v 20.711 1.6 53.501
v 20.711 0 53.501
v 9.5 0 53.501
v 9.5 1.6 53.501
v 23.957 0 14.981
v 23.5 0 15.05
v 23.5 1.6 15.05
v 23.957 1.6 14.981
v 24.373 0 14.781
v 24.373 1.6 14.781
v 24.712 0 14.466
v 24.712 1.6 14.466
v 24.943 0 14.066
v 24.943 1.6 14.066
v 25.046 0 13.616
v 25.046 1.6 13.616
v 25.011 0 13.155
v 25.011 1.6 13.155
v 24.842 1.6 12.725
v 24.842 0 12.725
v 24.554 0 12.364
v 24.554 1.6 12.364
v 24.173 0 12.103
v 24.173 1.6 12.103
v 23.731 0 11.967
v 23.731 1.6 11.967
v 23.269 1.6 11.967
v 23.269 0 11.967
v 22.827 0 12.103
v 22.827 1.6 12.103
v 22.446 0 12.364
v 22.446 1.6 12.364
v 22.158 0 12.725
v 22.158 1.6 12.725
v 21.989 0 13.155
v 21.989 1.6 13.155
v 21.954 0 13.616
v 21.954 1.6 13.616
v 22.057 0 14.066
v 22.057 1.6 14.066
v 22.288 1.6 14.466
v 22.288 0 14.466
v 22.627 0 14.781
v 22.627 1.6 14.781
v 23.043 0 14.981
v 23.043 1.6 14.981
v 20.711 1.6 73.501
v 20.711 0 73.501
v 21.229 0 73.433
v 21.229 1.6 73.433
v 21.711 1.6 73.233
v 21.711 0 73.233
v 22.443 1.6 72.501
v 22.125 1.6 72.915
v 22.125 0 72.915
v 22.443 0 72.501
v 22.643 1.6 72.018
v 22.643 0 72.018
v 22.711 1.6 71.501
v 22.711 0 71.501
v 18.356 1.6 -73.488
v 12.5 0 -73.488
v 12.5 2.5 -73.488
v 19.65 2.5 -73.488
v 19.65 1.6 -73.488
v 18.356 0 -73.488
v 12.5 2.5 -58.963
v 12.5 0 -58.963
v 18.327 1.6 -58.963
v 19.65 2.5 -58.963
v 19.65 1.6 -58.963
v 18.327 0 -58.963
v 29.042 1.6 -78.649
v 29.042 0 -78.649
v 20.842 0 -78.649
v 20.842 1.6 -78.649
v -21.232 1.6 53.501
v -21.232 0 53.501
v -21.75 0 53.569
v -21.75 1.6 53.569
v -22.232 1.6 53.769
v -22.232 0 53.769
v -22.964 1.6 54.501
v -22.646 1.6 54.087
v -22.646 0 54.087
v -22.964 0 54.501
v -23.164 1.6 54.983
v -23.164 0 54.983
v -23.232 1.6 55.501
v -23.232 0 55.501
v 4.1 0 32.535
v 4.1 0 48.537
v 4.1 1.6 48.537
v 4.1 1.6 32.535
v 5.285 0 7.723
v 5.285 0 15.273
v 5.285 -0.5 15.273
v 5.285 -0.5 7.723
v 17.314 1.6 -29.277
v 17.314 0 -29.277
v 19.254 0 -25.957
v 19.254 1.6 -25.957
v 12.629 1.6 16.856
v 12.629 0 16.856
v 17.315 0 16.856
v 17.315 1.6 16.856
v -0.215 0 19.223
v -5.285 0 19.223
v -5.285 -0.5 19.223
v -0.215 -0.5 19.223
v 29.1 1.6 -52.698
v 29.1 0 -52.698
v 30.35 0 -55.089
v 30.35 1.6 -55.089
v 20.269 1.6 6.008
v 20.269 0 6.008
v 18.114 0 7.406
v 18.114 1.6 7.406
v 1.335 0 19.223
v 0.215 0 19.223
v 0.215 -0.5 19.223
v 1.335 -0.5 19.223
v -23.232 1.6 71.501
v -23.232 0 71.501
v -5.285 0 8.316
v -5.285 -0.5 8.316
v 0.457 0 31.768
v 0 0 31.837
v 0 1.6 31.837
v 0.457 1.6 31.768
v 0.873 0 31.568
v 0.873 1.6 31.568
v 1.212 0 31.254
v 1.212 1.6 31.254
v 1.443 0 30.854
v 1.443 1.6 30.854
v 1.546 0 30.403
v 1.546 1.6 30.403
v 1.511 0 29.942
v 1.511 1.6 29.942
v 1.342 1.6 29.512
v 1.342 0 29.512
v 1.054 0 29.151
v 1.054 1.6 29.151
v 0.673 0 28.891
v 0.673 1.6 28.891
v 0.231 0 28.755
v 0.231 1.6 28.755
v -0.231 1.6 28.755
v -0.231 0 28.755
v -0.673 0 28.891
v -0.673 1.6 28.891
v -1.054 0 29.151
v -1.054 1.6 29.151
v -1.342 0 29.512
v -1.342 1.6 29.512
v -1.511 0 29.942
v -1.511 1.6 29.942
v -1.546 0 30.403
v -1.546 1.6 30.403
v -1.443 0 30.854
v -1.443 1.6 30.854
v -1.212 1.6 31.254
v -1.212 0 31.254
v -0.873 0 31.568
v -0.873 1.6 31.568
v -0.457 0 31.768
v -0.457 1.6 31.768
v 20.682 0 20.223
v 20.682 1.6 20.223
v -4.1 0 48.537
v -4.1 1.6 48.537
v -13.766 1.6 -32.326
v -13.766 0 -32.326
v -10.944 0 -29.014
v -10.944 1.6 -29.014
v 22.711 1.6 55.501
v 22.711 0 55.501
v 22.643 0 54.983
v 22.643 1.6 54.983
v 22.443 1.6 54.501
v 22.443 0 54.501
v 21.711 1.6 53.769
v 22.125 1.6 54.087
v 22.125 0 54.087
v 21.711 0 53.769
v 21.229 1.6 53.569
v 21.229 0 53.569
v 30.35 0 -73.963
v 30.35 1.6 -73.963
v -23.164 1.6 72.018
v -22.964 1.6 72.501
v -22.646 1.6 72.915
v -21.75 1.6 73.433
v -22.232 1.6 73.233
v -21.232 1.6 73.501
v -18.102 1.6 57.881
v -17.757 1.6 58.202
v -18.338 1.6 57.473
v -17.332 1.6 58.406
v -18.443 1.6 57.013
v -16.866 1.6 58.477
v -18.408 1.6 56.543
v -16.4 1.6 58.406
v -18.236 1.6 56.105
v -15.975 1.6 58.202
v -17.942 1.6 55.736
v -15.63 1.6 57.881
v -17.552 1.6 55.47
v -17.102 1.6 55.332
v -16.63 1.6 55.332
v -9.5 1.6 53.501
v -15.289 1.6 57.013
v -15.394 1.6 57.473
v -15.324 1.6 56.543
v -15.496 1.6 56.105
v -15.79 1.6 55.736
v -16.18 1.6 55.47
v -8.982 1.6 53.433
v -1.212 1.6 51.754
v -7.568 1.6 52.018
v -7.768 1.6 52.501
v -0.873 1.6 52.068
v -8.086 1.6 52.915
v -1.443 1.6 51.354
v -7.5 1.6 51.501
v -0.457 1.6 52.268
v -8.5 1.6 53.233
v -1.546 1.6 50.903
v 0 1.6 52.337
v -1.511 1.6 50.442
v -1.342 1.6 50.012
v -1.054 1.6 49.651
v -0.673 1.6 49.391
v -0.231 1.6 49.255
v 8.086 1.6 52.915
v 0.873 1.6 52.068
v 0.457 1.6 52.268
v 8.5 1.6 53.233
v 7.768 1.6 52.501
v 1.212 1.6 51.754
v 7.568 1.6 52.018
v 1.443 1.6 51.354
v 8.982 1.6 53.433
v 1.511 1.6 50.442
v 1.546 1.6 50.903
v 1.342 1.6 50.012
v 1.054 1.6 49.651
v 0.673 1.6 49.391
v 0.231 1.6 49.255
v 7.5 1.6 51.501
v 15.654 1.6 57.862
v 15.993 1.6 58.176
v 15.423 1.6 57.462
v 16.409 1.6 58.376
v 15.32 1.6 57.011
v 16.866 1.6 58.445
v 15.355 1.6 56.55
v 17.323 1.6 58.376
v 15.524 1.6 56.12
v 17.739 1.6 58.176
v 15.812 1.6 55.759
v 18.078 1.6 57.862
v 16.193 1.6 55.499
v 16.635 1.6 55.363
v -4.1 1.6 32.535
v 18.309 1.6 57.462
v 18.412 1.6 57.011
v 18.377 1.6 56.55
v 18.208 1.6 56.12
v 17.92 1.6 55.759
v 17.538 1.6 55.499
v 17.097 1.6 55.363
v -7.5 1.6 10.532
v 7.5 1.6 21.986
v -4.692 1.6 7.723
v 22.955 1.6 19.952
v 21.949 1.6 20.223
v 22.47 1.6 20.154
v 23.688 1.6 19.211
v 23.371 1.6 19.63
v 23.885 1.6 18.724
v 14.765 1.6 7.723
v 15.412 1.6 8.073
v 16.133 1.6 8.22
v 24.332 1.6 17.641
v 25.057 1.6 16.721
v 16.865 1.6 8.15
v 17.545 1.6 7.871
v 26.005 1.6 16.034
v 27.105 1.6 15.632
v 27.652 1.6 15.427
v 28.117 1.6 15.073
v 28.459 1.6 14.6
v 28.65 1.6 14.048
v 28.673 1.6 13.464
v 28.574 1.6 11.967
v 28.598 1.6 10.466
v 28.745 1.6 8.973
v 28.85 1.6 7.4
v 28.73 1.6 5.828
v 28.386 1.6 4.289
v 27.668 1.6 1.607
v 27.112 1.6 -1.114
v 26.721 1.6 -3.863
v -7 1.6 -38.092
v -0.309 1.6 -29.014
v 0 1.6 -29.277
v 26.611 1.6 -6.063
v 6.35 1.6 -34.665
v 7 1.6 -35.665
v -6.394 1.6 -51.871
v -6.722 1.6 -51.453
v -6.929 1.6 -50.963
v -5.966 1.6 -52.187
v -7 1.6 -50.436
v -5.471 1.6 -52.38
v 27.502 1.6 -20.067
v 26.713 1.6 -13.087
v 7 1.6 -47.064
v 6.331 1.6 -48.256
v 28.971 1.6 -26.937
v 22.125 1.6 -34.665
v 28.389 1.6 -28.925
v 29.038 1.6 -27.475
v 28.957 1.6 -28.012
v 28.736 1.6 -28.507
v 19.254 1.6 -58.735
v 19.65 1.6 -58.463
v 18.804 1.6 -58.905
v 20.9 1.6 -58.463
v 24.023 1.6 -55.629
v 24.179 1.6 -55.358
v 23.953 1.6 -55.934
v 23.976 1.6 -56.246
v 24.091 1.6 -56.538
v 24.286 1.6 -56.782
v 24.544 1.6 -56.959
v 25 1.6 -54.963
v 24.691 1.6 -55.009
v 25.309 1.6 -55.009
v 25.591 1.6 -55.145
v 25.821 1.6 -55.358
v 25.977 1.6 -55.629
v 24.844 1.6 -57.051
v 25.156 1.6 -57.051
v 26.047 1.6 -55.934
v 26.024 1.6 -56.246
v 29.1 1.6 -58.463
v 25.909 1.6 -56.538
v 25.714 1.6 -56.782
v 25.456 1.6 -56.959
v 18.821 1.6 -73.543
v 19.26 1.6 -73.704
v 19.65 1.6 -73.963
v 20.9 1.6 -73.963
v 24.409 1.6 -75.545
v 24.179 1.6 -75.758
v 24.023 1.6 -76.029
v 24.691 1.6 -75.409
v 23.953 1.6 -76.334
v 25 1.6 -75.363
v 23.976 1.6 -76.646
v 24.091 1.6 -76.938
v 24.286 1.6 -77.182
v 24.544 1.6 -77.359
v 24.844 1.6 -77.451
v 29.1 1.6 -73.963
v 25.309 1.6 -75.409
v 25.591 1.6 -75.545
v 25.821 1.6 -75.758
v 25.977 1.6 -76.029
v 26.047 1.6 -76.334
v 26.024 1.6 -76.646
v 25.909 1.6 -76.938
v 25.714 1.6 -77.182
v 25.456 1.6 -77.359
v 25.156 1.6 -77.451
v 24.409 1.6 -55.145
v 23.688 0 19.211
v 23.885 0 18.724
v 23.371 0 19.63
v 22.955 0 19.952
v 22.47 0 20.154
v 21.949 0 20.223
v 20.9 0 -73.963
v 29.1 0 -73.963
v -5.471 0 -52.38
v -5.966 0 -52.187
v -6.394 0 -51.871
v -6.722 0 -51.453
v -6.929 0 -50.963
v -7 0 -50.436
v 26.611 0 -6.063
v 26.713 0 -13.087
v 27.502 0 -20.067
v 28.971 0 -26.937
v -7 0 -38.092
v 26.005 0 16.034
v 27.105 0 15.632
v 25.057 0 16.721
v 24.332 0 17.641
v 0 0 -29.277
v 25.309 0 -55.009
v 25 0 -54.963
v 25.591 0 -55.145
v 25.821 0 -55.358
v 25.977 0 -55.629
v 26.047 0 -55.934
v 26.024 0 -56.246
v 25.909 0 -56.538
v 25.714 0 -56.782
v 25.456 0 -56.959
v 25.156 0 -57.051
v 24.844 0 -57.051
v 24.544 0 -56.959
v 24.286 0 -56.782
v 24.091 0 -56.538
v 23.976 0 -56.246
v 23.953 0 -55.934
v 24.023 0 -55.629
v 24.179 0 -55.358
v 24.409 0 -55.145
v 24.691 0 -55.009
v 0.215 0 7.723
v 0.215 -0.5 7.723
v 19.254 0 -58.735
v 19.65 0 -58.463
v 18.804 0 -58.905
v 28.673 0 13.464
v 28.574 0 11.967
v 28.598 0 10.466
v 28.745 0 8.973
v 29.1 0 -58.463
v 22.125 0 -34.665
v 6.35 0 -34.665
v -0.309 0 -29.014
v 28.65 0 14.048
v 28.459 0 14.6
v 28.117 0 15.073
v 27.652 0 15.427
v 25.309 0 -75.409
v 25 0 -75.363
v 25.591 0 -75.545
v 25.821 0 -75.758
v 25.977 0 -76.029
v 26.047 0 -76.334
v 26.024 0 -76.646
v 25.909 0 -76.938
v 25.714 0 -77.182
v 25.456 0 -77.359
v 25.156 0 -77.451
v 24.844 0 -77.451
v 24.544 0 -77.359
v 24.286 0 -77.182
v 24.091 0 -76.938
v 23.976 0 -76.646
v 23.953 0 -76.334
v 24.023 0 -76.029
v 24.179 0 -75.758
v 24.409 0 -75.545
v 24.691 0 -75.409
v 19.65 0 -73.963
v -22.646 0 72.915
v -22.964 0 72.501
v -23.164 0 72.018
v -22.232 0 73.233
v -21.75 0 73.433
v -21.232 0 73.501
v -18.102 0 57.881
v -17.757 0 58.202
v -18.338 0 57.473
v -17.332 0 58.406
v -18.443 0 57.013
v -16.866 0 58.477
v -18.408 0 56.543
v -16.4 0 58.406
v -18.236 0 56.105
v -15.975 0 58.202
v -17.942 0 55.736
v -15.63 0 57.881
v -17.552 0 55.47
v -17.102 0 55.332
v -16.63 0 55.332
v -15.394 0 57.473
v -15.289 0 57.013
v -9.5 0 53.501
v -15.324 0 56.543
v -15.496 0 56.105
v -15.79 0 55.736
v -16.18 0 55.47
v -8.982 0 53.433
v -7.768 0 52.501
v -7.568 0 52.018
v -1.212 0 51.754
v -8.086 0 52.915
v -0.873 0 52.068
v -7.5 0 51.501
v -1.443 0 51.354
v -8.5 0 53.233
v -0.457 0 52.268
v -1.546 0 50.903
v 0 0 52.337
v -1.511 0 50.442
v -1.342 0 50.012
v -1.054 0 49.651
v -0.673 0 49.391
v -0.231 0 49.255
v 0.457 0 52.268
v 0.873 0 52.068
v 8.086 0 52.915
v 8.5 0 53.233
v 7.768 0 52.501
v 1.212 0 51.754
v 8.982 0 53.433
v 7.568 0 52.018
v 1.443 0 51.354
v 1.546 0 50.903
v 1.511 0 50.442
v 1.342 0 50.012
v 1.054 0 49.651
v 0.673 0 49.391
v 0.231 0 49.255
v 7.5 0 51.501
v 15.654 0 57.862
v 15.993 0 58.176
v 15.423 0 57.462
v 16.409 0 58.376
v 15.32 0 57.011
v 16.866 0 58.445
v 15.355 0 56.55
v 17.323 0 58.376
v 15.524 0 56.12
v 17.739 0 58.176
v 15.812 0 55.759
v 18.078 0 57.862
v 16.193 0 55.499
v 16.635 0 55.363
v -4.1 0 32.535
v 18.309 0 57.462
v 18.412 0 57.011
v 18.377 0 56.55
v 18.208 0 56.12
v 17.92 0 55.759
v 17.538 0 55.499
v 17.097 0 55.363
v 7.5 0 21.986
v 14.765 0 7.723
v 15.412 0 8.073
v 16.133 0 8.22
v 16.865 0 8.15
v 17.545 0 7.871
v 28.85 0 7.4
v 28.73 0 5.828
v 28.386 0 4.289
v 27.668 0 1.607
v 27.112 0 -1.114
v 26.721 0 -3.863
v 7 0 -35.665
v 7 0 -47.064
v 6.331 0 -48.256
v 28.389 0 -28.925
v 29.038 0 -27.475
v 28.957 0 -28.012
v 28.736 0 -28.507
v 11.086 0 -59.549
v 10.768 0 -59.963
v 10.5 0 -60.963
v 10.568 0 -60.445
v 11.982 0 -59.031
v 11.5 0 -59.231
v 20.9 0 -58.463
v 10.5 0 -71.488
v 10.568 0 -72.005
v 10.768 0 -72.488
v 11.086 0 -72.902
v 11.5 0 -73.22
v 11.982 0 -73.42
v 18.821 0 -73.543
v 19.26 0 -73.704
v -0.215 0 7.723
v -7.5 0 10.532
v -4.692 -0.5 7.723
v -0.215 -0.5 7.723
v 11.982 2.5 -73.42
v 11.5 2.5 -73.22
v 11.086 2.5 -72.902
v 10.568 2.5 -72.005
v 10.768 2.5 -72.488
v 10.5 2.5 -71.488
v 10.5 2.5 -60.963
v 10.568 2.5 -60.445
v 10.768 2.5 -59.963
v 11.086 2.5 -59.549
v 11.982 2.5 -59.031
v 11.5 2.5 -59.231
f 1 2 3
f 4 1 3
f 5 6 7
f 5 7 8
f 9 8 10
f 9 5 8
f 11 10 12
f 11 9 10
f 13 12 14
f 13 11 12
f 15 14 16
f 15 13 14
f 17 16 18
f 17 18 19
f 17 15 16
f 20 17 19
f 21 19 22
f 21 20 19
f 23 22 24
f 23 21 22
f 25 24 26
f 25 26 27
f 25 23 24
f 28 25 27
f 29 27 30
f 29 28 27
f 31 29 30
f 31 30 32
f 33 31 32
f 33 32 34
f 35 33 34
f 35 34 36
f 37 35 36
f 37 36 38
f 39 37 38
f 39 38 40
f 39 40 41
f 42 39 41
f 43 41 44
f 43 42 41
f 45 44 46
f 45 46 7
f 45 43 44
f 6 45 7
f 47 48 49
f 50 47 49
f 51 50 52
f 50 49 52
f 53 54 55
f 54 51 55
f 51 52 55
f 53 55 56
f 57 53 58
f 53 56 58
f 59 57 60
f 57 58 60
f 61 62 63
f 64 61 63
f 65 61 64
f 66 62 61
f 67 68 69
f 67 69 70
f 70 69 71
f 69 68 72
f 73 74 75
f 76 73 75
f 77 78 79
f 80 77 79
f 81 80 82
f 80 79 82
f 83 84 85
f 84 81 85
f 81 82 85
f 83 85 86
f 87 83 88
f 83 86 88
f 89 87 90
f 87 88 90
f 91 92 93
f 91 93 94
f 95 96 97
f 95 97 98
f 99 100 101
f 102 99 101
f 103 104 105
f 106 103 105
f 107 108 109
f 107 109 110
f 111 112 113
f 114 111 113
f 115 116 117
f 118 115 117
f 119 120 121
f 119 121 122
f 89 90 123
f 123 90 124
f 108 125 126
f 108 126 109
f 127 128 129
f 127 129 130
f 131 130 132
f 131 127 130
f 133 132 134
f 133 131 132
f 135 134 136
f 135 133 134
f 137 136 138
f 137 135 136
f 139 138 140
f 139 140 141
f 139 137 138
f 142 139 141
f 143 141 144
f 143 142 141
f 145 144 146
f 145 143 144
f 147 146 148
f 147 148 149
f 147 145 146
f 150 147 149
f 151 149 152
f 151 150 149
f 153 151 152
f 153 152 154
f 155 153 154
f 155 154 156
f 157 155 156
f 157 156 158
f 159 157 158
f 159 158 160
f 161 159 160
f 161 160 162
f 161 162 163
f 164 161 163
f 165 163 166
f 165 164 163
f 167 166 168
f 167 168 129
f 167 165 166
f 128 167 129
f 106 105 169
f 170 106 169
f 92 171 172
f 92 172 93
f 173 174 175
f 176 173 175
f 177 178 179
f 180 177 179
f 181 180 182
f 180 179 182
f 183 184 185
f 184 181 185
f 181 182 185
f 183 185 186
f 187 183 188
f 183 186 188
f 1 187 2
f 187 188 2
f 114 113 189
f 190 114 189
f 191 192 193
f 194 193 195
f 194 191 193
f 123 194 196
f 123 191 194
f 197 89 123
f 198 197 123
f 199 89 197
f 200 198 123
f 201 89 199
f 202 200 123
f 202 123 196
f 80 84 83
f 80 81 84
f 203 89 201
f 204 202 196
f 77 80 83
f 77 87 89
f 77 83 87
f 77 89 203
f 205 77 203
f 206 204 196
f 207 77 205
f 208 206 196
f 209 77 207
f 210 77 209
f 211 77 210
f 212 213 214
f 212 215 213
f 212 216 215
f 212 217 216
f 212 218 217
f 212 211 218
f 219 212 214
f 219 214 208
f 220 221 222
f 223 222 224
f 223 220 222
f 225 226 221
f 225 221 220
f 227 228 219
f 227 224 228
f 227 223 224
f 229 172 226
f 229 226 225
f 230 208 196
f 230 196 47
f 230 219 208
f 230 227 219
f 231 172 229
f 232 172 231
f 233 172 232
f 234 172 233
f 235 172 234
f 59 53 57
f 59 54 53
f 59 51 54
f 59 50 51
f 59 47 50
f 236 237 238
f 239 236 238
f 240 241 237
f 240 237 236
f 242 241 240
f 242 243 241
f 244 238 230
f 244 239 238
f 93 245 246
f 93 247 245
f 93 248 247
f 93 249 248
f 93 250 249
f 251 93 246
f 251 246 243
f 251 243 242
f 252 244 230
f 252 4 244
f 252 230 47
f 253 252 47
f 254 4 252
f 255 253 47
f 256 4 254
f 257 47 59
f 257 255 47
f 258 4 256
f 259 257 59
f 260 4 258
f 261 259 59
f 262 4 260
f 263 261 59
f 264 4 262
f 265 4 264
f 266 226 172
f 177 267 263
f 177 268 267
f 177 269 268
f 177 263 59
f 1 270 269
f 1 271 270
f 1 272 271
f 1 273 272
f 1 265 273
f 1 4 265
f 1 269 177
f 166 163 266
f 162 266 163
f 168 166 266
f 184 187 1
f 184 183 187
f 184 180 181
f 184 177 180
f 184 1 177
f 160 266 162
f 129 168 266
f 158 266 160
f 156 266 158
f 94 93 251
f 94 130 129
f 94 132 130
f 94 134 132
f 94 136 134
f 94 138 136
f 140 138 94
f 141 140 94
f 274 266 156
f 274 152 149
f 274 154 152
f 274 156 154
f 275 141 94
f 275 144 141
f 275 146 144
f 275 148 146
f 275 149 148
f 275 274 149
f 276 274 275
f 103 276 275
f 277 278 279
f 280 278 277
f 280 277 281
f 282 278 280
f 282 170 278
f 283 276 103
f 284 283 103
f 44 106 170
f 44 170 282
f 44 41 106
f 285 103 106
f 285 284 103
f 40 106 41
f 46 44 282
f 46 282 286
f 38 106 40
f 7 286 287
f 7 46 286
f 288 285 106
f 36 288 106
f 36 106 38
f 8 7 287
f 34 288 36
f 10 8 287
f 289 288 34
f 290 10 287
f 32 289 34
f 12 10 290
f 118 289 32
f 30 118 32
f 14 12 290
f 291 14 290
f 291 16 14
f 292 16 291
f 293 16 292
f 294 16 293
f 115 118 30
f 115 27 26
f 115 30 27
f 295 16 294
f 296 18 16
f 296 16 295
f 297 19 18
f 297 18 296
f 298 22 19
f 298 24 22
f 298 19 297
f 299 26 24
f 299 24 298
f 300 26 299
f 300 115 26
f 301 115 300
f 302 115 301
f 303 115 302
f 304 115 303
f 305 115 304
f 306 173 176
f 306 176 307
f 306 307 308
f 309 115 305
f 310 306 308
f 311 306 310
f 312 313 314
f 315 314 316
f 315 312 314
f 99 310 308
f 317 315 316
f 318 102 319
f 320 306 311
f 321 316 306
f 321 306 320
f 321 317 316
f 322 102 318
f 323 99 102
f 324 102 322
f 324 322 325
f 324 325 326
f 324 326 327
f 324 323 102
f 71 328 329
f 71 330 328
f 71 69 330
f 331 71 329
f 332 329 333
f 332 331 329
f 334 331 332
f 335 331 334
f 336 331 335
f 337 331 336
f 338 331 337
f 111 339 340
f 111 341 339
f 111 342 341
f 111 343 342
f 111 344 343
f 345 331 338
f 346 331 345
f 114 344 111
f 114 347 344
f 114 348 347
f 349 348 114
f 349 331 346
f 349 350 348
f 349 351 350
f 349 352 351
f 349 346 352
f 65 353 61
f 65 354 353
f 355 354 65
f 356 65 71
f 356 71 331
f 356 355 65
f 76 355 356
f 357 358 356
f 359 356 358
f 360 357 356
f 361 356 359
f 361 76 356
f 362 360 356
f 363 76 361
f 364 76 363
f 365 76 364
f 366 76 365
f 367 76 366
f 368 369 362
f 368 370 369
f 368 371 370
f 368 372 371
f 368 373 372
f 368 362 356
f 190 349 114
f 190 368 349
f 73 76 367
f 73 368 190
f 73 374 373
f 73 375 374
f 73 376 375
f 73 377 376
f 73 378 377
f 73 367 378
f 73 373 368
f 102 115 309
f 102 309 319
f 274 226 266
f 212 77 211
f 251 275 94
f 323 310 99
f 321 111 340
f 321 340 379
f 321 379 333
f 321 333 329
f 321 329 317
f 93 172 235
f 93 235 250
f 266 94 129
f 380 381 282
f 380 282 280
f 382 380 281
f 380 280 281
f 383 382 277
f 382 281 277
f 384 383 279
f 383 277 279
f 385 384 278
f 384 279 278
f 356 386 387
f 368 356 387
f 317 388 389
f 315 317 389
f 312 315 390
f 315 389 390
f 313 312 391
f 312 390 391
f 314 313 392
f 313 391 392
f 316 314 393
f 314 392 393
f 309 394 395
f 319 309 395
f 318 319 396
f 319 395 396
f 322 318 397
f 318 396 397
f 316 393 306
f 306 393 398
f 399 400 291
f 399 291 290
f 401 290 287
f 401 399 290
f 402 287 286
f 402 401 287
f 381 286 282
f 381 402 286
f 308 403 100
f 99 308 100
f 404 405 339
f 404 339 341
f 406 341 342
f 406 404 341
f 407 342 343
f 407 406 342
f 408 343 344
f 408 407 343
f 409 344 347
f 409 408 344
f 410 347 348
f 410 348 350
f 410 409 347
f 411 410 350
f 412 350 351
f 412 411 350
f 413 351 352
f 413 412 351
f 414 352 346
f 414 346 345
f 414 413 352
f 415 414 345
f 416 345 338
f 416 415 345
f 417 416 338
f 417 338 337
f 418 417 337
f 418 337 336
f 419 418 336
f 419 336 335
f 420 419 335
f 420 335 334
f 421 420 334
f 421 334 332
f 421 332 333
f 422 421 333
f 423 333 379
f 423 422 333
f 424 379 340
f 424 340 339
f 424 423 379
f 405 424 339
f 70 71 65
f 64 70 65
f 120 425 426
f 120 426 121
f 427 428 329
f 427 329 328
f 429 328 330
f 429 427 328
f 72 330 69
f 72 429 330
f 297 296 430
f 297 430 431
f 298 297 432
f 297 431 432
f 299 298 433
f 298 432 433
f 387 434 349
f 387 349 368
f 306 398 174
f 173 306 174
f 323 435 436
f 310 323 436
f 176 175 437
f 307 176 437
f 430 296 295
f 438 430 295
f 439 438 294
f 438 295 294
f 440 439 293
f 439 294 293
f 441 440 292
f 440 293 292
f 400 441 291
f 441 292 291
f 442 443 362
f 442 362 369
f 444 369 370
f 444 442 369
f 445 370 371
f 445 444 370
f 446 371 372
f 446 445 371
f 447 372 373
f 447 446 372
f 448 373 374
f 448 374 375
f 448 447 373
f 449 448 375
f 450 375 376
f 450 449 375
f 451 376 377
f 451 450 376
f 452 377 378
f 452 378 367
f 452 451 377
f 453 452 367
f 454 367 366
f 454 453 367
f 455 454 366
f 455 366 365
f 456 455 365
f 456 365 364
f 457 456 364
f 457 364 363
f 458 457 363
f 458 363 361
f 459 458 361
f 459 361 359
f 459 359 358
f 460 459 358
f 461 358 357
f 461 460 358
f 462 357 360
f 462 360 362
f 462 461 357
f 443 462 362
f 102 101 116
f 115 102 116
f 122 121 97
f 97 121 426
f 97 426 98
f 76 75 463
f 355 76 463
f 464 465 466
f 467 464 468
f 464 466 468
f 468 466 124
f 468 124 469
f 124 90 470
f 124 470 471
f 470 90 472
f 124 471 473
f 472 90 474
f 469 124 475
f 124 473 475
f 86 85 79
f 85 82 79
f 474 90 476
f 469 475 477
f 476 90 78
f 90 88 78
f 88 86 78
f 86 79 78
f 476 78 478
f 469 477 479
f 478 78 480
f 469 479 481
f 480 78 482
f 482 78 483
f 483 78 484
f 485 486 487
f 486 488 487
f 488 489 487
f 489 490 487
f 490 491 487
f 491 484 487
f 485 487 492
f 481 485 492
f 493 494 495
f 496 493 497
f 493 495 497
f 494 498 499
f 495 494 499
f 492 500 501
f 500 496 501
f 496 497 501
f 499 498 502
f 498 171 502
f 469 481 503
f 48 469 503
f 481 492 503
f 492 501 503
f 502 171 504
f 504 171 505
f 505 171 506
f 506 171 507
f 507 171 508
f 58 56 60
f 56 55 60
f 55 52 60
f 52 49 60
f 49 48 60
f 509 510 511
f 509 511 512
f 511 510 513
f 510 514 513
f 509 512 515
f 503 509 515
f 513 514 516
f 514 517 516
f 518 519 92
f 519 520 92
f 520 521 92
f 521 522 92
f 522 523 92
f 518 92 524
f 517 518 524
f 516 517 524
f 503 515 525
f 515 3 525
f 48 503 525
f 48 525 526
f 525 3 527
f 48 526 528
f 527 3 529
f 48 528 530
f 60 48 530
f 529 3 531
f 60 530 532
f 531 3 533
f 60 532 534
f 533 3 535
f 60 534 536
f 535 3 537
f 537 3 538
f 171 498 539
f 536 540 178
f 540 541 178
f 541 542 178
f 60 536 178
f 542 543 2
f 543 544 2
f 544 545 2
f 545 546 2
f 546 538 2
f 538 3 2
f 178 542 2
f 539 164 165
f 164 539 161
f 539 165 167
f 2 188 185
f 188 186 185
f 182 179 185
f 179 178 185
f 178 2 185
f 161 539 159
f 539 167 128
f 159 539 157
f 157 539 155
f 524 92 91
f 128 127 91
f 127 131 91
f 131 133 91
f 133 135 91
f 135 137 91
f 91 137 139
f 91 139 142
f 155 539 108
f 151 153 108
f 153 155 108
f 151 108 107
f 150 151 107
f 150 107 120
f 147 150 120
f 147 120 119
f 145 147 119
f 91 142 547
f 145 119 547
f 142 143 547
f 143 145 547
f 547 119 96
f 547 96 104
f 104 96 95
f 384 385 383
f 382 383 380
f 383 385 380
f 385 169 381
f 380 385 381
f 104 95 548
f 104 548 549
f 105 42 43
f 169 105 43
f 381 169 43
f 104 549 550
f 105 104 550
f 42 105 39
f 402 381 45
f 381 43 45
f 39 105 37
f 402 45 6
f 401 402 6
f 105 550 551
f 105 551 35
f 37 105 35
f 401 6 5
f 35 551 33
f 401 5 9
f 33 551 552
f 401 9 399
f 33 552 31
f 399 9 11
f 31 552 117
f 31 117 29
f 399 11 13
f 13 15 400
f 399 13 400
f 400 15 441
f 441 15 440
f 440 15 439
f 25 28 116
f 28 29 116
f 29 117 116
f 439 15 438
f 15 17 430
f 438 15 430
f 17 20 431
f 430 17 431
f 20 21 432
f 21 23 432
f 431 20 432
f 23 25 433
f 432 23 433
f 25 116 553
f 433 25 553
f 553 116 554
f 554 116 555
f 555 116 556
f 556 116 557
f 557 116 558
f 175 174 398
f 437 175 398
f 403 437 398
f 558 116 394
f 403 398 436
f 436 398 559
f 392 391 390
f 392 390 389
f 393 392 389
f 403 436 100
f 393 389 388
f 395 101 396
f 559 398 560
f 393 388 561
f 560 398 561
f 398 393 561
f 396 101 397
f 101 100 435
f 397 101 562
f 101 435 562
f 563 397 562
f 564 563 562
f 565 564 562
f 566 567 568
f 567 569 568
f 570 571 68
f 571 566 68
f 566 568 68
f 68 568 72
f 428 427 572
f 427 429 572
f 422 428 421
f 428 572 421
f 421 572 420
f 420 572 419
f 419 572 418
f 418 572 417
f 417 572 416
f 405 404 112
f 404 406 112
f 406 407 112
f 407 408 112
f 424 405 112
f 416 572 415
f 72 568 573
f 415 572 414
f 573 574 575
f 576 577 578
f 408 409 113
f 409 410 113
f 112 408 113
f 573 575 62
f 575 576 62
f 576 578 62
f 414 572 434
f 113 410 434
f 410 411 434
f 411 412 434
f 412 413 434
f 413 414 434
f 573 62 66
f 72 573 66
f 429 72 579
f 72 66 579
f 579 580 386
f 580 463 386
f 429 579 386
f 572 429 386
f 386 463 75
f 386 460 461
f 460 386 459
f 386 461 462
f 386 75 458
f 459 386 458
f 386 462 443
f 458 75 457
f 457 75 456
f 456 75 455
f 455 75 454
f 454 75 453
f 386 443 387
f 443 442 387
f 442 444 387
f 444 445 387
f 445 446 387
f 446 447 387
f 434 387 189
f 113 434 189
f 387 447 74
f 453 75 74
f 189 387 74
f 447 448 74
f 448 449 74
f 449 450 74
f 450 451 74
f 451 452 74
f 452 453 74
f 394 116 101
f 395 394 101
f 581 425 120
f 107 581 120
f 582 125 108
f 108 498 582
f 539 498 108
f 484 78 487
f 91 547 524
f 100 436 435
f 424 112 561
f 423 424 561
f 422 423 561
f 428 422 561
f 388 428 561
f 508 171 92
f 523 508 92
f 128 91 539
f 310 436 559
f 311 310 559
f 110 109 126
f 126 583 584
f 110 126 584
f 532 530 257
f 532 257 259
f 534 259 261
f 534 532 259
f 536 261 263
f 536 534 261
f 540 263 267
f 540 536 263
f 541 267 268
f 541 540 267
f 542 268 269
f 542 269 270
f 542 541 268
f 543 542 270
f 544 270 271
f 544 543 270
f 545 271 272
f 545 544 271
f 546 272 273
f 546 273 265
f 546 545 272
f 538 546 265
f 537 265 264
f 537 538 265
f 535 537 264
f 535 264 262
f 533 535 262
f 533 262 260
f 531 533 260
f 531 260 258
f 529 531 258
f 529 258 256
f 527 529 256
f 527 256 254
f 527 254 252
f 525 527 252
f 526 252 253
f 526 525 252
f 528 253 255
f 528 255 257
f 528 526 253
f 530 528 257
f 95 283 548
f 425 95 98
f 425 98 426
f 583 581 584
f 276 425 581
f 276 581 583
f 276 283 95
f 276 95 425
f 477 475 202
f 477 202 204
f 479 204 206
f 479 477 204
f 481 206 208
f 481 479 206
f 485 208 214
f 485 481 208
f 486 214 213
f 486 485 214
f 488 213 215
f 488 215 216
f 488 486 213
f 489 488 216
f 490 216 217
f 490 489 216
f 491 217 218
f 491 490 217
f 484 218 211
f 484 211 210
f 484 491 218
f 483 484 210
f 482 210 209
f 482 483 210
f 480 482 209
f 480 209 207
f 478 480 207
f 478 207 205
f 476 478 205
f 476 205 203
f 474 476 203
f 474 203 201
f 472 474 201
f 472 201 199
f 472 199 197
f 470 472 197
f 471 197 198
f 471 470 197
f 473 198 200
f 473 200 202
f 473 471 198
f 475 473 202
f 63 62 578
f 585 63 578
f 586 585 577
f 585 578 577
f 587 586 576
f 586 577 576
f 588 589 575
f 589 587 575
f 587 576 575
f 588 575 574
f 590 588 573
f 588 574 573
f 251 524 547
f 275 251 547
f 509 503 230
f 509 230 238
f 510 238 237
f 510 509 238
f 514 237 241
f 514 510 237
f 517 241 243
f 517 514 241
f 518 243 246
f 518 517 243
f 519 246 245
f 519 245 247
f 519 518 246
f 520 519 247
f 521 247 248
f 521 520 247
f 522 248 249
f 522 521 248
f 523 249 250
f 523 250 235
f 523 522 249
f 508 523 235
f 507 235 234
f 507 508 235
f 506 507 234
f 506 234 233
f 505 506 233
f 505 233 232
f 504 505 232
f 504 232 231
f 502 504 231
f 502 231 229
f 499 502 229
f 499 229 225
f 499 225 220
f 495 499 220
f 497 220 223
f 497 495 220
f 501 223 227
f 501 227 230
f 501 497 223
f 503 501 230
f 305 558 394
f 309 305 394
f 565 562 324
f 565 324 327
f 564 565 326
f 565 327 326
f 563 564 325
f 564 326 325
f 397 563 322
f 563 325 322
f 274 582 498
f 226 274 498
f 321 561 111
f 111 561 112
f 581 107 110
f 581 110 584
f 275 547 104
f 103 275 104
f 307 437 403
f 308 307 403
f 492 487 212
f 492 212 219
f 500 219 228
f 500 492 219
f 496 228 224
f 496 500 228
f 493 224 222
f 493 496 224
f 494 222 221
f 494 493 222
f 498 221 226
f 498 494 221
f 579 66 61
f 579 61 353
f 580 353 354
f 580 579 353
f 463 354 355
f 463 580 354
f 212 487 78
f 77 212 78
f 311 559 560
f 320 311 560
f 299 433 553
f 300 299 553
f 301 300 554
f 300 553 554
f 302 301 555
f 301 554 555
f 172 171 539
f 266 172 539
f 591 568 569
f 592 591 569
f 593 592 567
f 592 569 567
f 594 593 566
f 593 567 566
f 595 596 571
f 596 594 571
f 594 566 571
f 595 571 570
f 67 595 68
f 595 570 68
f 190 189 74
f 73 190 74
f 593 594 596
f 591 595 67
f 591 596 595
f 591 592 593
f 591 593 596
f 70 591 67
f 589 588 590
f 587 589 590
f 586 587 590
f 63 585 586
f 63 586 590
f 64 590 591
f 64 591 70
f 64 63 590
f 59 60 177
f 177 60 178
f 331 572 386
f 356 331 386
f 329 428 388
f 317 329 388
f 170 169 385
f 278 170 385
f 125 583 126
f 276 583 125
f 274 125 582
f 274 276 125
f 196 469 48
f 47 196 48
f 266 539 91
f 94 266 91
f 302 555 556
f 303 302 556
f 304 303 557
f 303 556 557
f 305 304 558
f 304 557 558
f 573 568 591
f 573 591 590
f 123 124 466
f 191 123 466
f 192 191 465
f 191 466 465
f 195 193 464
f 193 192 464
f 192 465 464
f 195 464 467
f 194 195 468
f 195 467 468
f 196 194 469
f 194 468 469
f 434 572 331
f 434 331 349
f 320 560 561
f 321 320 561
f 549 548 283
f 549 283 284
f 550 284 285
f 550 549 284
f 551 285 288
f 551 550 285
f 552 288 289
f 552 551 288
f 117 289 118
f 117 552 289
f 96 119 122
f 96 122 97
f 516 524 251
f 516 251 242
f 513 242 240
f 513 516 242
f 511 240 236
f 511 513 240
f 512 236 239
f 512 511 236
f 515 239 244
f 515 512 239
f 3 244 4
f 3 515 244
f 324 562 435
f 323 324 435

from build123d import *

# Parameters (mm, degrees)
SKETCH_1_R            = 1.55
SKETCH_1_R_2          = 1.05
SKETCH_1_R_3          = 1.581404189
SKETCH_1_W            = 8.2
SKETCH_1_H            = 15.5
SKETCH_1_H_2          = 16.001858204
EXTRUDE_1_DEPTH       = 1.6
SKETCH_1900_R         = 4.25
SKETCH_1900_R_2       = 2.5
CUT_EXTRUDE_5_DEPTH   = 85.317277267
EXTRUDE_3627_DEPTH    = 0.5
SKETCH_3_W            = 9.15
SKETCH_3_H            = 14.525
JST_GH_4PIN_X_2_DEPTH = 2.5
FILLET_3_R            = 2
EXTRUDE_START         = -1.6
EXTRUDE_5402_DEPTH    = 1.6


with BuildPart() as part:
    # 草图1 → 凸台-拉伸1 (new body)
    with BuildSketch(Plane(origin=(0, 0, 0), x_dir=(1, 0, 0), z_dir=(0, 1, 0))):
        Polygon((17.624917378, -7.723117708), (-4.691592189, -7.723117708), (-7.5, -10.531525519), (-7.5, -53.500834243), (-23.23198905, -53.500834243), (-23.23198905, -73.500834243), (22.7111878, -73.500834243), (22.7111878, -53.500834243), (7.5, -53.500834243), (7.5, -21.98577592), (12.62948765, -16.856288271), (17.315171978, -16.856288271), (20.682001416, -20.223117708), (26.774367048, -20.223117708), (29.820182402, -19.217148973), (29.820182402, 27.613551536), (22.124670003, 34.665102629), (18.4, 34.665102629), (6.35, 34.665102629), (7, 35.665102629), (7, 47.064038047), (6.331493599, 48.255532994), (29.1, 52.697797243), (30.35, 55.088888723), (30.35, 73.962756038), (29.042220737, 78.649353117), (20.842220737, 78.649353117), (19.65, 73.962756038), (19.65, 58.462756038), (-7, 52.009711353), (-7, 37.490925595), (0, 29.276882292), (17.314498575, 29.276882292), (19.254012403, 25.957144), (20.269436965, -6.007948815), align=None)
        with Locations(Location((0, -30.287243962, 0), (0, 0, 270))):
            Circle(SKETCH_1_R, mode=Mode.SUBTRACT)
        with Locations(Location((0, -50.787243962, 0), (0, 0, 270))):
            Circle(SKETCH_1_R, mode=Mode.SUBTRACT)
        with Locations(Location((25, 76.412756037, 0), (0, 0, 270))):
            Circle(SKETCH_1_R_2, mode=Mode.SUBTRACT)
        with Locations(Location((25, 56.012756039, 0), (0, 0, 270))):
            Circle(SKETCH_1_R_2, mode=Mode.SUBTRACT)
        with Locations(Location((23.5, -13.5, 0), (0, 0, 270))):
            Circle(SKETCH_1_R, mode=Mode.SUBTRACT)
        with Locations(Location((-16.865979253, -56.895287035, 0), (0, 0, 270))):
            Circle(SKETCH_1_R_3, mode=Mode.SUBTRACT)
        with Locations(Location((16.865979253, -56.895287035, 0), (0, 0, 270))):
            Circle(SKETCH_1_R, mode=Mode.SUBTRACT)
        with Locations((25, 66.212756038)):
            Rectangle(SKETCH_1_W, SKETCH_1_H, mode=Mode.SUBTRACT)
        with Locations((0, -40.536314862)):
            Rectangle(SKETCH_1_W, SKETCH_1_H_2, mode=Mode.SUBTRACT)
    extrude(amount=EXTRUDE_1_DEPTH)

    # Sketch 1900 → 切除-拉伸5 (cut, through all)
    with BuildSketch(Plane(origin=(0, 0, 0), x_dir=(1, 0, 0), z_dir=(0, 1, 0))):
        with BuildLine():
            ThreePointArc((32.25, -19.787243962), (31.591537652, -17.514941761), (29.820184804, -15.946745651))
            Line((29.820184804, -15.946745651), (29.820138471, -18.164164281))
            ThreePointArc((29.820138471, -18.164164281), (29.388960143, -16.929984913), (29.04688934, -15.668200055))
            ThreePointArc((29.04688934, -15.668200055), (24.645020142, -22.396192055), (32.25, -19.787243962))
        make_face()
        with BuildLine():
            Line((29.820138471, -18.164164281), (29.820184804, -15.946745651))
            ThreePointArc((29.820184804, -15.946745651), (29.440286586, -15.788734921), (29.04688934, -15.668200055))
            ThreePointArc((29.04688934, -15.668200055), (29.388960143, -16.929984913), (29.820138471, -18.164164281))
        make_face()
        with Locations((28, -19.787243962)):
            Circle(SKETCH_1900_R)
        with BuildLine():
            ThreePointArc((29.389676683, 28.446687445), (29.699958614, 29.863367854), (29.821172201, 31.308554874))
            Line((29.821172201, 31.308554874), (29.820138471, -18.164164281))
            ThreePointArc((29.820138471, -18.164164281), (28.692543787, -13.637691906), (28.744612063, -8.973175765))
            ThreePointArc((28.744612063, -8.973175765), (28.818369707, -6.611977276), (28.386269498, -4.289481227))
            ThreePointArc((28.386269498, -4.289481227), (27.36992989, -0.250862064), (26.720671038, 3.862756038))
            Line((26.720671038, 3.862756038), (26.610745663, 6.062756038))
            ThreePointArc((26.610745663, 6.062756038), (27.113818567, 17.364766035), (29.389676683, 28.446687445))
        make_face()
        with Locations((28, 36.212756038)):
            Circle(SKETCH_1900_R)
        with Locations((16.265283418, -5.723117708)):
            Circle(SKETCH_1900_R_2)
    extrude(amount=CUT_EXTRUDE_5_DEPTH, mode=Mode.SUBTRACT)

    # Sketch 2795 → Extrude 3627 (add)
    with BuildSketch(Plane(origin=(0, 0, 0), x_dir=(1, 0, 0), z_dir=(0, 1, 0))):
        Polygon((5.284716582, -7.723117708), (0.215283418, -7.723117708), (0.215283418, -19.223117708), (1.334716582, -19.223117708), (5.284716582, -15.273117708), align=None)
        Polygon((-0.215283418, -7.723117708), (-4.691592189, -7.723117708), (-5.284716582, -8.316242101), (-5.284716582, -19.223117708), (-0.215283418, -19.223117708), align=None)
    extrude(amount=-EXTRUDE_3627_DEPTH)

    # Sketch 3 → JST-GH-4Pin x 2 (add)
    with BuildSketch(Plane(origin=(0, 0, 0), x_dir=(1, 0, 0), z_dir=(0, 1, 0))):
        with Locations((15.075, 66.225256038)):
            Rectangle(SKETCH_3_W, SKETCH_3_H)
    extrude(amount=JST_GH_4PIN_X_2_DEPTH)

    # 圆角3
    # the kernel refuses this fillet: 2 mm, written as the material it adds along each edge
    with BuildSketch(Plane(origin=(19.65, 0, -58.962756038), x_dir=(0, 0, 1), z_dir=(0, 1, 0))) as fillet_3_piece_1:
        with BuildLine():
            CenterArc((2, -1.322875656), FILLET_3_R, 138.590377891, 41.409622109)
            Line((0, -1.322875656), (0, 0))
            Line((0, 0), (0.5, 0))
        make_face()
    extrude(amount=1.6)
    with BuildSketch(Plane(origin=(19.65, 0, -73.487756038), x_dir=(0, 0, -1), z_dir=(0, 1, 0))) as fillet_3_piece_2:
        with BuildLine():
            CenterArc((2, 1.293976429), FILLET_3_R, 180, 40.314909173)
            Line((0, 1.293976429), (0, 0))
            Line((0, 0), (0.475, 0))
        make_face()
    extrude(amount=1.6)
    with BuildSketch(Plane(origin=(7.5, 0, 53.500834243), x_dir=(0, 0, -1), z_dir=(0, 1, 0)), Plane(origin=(-7.5, 0, 53.500834243), x_dir=(-1, 0, 0), z_dir=(0, 1, 0))) as fillet_3_piece_3:
        with BuildLine():
            CenterArc((FILLET_3_R, -FILLET_3_R), FILLET_3_R, 90, 90)
            Line((0, -FILLET_3_R), (0, 0))
            Line((0, 0), (FILLET_3_R, 0))
        make_face()
    extrude(amount=1.6)
    # the kernel refuses this fillet: 2 mm, written as the material it takes off along each edge
    with BuildSketch(Plane(origin=(10.5, -5, -58.962756038), x_dir=(0, 0, -1), z_dir=(0, 1, 0)), Plane(origin=(10.5, -5, -73.487756038), x_dir=(1, 0, 0), z_dir=(0, 1, 0))) as fillet_3_2_piece_1:
        with BuildLine():
            CenterArc((FILLET_3_R, -FILLET_3_R), FILLET_3_R, 90, 90)
            Line((0, -FILLET_3_R), (0, 0))
            Line((0, 0), (FILLET_3_R, 0))
        make_face()
    extrude(amount=12.5, mode=Mode.SUBTRACT)
    with BuildSketch(Plane(origin=(-7, -3.933789701, -52.009711353), x_dir=(0.9719132109472551, 0, -0.23533956400528205), z_dir=(0, 1, 0))) as fillet_3_2_piece_2:
        with BuildLine():
            CenterArc((FILLET_3_R * 0.786757940299, -FILLET_3_R), FILLET_3_R, 90, 76.388360252)
            Line((-FILLET_3_R * 0.185155270648, -FILLET_3_R * 0.764660435995), (0, 0))
            Line((0, 0), (FILLET_3_R * 0.786757940299, 0))
        make_face()
    extrude(amount=9.467579403, mode=Mode.SUBTRACT)
    with BuildSketch(Plane(origin=(23.77241037, 6.158816797, 20.223117708), x_dir=(-1, 0, 0), z_dir=(0, -1, 0))) as fillet_3_2_piece_3:
        with BuildLine():
            CenterArc((1.823526719, 2), FILLET_3_R, 194.492910043, 75.507089957)
            ThreePointArc((-0.112830513, 1.499479599), (0.010429415, 0.754769623), (0, 0))
            Line((0, 0), (1.823526719, 0))
        make_face()
    extrude(amount=10.717633594, mode=Mode.SUBTRACT)
    with BuildSketch(Plane(origin=(-23.23198905, -5, 73.500834243), x_dir=(0, 0, -1), z_dir=(0, 1, 0)), Plane(origin=(22.7111878, -5, 73.500834243), x_dir=(-1, 0, 0), z_dir=(0, 1, 0)), Plane(origin=(22.7111878, -5, 53.500834243), x_dir=(0, 0, 1), z_dir=(0, 1, 0)), Plane(origin=(-23.23198905, -5, 53.500834243), x_dir=(1, 0, 0), z_dir=(0, 1, 0))) as fillet_3_2_piece_4:
        with BuildLine():
            CenterArc((FILLET_3_R, -FILLET_3_R), FILLET_3_R, 90, 90)
            Line((0, -FILLET_3_R), (0, 0))
            Line((0, 0), (FILLET_3_R, 0))
        make_face()
    extrude(amount=11.6, mode=Mode.SUBTRACT)
    with BuildSketch(Plane(origin=(29.290123585, 4.655582445, -28.099254974), x_dir=(-0.26492584299558386, 0, 0.9642687891418446), z_dir=(0, -1, 0))) as fillet_3_2_piece_5:
        with BuildLine():
            CenterArc((1.222348791, 1.99992922), FILLET_3_R, 207.137102211, 62.380861619)
            Line((-0.557486463, 1.087686672), (0, 0))
            ThreePointArc((0, 0), (0.602761377, 0.002535566), (1.205522753, 0))
        make_face()
    extrude(amount=7.71116489, mode=Mode.SUBTRACT)
    with BuildSketch(Plane(origin=(29.04688934, 7.189707678, 15.668200055), x_dir=(-0.9998305759549154, 0, -0.018407047173896997), z_dir=(0, -1, 0))) as fillet_3_2_piece_6:
        with BuildLine():
            CenterArc((2.398675677, 1.947113498), FILLET_3_R, 172.818157219, 83.976285302)
            ThreePointArc((0.414366937, 2.197151144), (0.240731561, 1.092248642), (0, 0))
            ThreePointArc((0, 0), (0.970892536, 0.112383816), (1.941785072, 0))
        make_face()
    extrude(amount=12.779415356, mode=Mode.SUBTRACT)

    # Sketch 3 2 → Extrude 5402 (add)
    with BuildSketch(Plane(origin=(0, 1.6, 0), x_dir=(1, 0, 0), z_dir=(0, 1, 0)).offset(EXTRUDE_START)):
        Polygon((-13.766428784, 32.326134419), (-10.943503558, 29.013615841), (-0.308926004, 29.013615841), (0, 29.276882292), (-7, 37.490925595), (-7, 38.092478683), align=None)
    extrude(amount=EXTRUDE_5402_DEPTH)


solid = part.part
